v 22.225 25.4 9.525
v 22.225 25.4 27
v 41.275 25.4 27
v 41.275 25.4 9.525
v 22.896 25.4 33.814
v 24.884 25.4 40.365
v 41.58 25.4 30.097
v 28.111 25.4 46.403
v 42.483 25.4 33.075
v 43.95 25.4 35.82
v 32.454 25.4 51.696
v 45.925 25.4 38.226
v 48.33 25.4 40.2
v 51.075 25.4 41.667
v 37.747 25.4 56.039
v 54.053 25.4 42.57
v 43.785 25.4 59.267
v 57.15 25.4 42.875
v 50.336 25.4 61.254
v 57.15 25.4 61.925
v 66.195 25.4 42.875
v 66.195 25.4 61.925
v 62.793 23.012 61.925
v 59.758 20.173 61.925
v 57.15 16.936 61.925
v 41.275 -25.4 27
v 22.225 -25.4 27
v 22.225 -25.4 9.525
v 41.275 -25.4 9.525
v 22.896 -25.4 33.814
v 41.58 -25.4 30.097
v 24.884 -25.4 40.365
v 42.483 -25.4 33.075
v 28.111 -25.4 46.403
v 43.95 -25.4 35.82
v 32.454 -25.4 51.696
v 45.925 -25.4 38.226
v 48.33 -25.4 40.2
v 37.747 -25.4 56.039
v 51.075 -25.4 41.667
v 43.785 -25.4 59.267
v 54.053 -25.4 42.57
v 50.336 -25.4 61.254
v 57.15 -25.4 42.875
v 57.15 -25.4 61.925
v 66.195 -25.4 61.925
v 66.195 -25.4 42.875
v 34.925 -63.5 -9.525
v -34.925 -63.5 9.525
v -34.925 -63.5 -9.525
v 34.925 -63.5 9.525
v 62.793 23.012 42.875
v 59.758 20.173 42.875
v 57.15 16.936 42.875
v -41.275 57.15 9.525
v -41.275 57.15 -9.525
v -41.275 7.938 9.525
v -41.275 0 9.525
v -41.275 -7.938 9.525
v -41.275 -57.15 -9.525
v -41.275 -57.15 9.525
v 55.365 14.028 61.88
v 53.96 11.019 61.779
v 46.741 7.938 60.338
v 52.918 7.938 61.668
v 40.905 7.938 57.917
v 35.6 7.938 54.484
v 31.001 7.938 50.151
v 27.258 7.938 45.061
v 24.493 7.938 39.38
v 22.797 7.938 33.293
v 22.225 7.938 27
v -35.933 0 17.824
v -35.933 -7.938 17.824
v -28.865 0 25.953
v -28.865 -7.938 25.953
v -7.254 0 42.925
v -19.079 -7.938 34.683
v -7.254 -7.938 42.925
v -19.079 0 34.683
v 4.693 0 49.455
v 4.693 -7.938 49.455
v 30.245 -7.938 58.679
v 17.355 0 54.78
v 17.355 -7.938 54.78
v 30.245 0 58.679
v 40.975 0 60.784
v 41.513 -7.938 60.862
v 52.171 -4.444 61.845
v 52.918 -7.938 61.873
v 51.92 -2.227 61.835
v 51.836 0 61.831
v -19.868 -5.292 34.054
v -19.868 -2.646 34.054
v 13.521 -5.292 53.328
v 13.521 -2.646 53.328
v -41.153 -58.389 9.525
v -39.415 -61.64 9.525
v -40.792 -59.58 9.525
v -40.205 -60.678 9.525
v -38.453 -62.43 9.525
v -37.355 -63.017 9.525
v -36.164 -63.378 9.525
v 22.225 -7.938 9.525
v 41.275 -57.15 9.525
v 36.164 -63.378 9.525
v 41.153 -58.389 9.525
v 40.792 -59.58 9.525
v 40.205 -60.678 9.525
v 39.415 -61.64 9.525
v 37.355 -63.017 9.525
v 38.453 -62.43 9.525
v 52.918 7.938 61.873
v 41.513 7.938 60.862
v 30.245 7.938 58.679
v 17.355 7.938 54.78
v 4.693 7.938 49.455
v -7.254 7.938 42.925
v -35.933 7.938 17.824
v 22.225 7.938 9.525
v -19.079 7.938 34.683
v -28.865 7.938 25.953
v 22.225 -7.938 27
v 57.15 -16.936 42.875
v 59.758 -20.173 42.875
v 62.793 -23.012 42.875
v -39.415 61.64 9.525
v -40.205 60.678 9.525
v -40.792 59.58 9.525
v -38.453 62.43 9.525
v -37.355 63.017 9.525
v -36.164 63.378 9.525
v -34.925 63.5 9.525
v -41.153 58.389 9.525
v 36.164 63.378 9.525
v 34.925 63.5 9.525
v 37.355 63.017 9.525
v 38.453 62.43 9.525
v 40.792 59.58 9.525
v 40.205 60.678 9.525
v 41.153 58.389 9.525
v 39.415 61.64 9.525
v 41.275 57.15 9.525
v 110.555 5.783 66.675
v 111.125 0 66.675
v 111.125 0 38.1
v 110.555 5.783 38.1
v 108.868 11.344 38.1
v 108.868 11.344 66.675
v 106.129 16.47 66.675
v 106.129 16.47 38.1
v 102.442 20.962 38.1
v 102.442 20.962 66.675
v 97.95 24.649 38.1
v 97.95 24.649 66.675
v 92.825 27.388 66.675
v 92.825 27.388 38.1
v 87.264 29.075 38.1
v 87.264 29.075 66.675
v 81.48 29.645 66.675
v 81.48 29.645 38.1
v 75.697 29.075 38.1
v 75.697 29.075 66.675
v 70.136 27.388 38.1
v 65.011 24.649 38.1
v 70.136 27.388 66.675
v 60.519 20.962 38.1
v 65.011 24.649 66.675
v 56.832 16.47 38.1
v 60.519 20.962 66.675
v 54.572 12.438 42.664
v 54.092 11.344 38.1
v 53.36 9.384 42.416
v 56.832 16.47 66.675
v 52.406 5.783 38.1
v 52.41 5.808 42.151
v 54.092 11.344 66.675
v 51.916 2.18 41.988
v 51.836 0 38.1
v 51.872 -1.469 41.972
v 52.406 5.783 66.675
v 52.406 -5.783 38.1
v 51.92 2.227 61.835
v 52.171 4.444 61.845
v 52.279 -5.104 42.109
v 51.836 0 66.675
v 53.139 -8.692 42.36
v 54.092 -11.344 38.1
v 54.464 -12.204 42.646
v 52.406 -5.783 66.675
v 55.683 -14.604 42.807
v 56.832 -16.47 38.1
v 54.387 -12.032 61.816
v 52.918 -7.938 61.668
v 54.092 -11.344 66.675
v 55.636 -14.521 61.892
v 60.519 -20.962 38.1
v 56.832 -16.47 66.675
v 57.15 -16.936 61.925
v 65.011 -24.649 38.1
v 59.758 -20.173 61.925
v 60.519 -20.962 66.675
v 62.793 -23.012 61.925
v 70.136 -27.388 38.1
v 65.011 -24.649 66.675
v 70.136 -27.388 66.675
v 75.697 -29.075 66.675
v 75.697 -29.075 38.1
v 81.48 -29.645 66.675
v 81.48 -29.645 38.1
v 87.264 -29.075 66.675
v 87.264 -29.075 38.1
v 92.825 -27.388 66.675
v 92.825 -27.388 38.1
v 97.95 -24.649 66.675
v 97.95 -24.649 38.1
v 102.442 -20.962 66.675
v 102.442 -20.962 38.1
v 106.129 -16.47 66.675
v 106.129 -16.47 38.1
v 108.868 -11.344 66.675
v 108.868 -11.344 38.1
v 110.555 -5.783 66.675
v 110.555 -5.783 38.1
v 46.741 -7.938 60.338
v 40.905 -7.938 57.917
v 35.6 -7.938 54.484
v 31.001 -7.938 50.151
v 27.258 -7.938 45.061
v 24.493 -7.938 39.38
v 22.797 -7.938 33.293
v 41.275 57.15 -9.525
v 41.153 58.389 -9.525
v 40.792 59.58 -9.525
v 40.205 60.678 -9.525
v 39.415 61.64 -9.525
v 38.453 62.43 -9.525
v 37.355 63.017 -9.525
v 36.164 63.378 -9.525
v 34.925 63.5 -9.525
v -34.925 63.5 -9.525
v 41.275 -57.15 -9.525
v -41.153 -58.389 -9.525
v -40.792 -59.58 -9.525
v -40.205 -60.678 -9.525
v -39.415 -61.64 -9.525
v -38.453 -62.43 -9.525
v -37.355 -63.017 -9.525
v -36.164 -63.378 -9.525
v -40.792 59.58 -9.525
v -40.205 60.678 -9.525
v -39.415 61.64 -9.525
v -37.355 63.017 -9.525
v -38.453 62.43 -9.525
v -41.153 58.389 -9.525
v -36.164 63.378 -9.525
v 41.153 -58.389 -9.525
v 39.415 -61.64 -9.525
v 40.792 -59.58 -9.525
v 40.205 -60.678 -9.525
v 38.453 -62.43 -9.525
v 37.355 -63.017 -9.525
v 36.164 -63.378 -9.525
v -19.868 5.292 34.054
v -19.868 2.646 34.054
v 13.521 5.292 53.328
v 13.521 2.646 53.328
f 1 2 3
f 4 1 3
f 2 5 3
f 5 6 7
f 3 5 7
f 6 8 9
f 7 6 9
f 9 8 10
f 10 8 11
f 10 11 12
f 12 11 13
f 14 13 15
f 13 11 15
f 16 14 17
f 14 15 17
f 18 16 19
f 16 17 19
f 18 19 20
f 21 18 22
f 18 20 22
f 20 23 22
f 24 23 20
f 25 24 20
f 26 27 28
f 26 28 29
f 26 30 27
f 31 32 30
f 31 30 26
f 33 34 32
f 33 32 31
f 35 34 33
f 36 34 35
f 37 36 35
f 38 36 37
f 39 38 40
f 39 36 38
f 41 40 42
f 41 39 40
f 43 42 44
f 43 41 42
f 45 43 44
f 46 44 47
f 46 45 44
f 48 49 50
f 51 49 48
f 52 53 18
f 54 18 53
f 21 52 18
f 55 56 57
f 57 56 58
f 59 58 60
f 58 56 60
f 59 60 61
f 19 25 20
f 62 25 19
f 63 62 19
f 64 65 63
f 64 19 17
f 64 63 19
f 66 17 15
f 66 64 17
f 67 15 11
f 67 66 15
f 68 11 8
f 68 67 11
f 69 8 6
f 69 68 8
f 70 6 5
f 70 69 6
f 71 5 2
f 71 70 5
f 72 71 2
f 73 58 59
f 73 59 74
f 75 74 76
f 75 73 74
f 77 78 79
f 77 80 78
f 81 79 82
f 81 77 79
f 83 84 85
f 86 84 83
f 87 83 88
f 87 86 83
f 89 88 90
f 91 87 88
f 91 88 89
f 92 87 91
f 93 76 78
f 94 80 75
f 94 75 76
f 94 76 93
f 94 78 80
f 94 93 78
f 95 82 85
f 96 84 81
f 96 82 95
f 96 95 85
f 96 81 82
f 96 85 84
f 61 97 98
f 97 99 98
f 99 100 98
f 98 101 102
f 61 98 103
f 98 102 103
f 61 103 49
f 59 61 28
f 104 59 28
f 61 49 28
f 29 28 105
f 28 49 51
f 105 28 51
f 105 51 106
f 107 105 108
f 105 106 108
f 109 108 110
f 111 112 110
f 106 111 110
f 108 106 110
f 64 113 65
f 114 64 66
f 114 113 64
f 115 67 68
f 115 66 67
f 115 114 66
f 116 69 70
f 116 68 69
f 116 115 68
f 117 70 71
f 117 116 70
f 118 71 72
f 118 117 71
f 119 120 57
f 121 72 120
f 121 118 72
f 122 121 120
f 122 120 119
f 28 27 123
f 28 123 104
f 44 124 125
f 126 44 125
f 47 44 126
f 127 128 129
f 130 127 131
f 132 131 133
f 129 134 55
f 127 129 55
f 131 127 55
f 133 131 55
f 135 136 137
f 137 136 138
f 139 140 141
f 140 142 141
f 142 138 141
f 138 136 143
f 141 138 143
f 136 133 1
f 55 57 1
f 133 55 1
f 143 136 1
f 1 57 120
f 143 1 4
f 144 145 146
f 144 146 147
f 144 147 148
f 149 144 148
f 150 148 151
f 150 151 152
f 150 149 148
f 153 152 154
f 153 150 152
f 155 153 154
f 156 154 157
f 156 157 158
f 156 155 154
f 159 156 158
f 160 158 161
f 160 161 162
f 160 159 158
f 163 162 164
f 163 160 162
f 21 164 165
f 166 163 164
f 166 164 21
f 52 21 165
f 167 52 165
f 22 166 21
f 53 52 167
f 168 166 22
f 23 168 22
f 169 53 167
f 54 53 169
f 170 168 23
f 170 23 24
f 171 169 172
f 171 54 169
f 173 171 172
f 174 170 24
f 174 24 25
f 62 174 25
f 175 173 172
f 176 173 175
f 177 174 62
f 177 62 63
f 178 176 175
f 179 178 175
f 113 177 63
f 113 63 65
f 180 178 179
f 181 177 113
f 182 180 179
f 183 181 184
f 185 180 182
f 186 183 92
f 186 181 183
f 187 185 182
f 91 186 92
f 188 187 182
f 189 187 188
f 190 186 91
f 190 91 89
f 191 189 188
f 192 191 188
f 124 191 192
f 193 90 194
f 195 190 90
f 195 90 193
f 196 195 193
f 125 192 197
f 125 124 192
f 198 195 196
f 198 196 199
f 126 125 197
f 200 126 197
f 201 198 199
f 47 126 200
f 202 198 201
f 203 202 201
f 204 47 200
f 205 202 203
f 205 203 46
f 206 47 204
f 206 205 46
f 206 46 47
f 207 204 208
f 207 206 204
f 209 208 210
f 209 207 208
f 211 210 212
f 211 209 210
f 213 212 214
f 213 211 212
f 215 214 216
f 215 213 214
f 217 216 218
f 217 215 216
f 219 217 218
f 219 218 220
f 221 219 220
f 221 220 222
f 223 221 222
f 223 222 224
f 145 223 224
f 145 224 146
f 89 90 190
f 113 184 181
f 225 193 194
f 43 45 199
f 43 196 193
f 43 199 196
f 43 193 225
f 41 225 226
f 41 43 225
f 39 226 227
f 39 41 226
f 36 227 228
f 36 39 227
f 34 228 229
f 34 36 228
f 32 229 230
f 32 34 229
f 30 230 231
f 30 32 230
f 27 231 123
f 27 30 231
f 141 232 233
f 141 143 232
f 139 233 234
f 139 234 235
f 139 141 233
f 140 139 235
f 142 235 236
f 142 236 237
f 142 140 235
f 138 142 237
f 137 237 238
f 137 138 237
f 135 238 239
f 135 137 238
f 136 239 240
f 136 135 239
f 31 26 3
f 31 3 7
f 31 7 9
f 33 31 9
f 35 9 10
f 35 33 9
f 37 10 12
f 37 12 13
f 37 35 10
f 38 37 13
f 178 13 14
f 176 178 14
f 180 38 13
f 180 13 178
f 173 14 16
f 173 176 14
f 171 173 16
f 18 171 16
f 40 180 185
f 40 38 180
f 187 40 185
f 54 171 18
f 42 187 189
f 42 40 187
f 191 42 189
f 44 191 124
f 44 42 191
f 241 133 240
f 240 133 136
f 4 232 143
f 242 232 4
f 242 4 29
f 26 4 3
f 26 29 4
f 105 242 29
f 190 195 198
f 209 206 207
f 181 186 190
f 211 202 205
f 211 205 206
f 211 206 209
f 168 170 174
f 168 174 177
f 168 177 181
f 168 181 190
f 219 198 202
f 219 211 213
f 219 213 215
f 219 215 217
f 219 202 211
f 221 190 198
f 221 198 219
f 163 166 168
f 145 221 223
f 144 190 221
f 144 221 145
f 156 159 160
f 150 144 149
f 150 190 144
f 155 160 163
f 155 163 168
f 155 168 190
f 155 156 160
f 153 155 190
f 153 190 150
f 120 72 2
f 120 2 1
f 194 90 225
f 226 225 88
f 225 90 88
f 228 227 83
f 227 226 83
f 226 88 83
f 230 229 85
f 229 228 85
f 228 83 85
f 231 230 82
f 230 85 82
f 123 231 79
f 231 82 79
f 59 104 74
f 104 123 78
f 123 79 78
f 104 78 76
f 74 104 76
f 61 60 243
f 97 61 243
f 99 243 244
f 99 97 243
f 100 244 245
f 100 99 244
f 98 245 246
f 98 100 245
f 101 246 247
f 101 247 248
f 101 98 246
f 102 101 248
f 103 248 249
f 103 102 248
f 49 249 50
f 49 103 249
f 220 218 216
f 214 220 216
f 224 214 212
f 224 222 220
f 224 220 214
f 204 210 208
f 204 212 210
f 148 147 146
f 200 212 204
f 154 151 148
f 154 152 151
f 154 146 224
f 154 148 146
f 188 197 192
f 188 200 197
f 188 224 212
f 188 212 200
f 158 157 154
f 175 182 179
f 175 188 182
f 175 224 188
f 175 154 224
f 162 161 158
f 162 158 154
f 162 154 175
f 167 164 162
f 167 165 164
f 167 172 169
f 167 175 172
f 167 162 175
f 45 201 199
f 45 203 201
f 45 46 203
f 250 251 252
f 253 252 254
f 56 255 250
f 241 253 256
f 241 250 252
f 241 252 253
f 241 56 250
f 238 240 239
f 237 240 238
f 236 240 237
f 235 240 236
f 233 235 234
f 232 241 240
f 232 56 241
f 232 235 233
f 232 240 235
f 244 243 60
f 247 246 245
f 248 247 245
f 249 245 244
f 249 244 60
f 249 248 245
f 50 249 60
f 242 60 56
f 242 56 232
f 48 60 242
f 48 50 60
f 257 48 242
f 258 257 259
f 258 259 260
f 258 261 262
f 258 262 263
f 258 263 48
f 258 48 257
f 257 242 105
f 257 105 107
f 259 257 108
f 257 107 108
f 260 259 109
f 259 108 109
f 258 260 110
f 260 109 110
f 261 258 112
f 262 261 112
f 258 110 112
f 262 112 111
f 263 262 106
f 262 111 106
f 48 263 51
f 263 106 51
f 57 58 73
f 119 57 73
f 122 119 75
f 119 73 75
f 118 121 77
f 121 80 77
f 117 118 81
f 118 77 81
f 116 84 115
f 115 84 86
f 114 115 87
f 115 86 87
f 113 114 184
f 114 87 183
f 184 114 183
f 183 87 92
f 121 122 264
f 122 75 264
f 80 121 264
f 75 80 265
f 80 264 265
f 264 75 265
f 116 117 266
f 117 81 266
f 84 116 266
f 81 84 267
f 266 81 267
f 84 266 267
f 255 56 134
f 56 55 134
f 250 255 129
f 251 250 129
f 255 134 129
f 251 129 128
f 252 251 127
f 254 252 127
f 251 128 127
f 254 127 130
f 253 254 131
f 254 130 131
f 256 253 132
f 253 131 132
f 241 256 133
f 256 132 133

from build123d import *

# Parameters (mm, degrees)
F1_W     = 82.55
F1_H     = 19.05
F2_DEPTH = 63.5
F0_W     = 21.1554604056
F0_H     = 19.05
F3_DEPTH = 25.4
F4_DEPTH = 7.9375
F6_R     = 6.35
F7_R     = 6.35


with BuildPart() as f2:
    # F1 (on Front) → F2 (new body, symmetric)
    with BuildSketch(Plane.XZ):
        Rectangle(F1_W, F1_H)
    extrude(amount=F2_DEPTH, both=True)

    # F0 (on Front) → F3 (join, symmetric)
    with BuildSketch(Plane.XZ):
        with BuildLine():
            Line((22.225, 9.525), (41.275, 9.525))
            Line((41.275, 9.525), (41.275, 27.0002))
            ThreePointArc((41.275, 27.0002), (45.9246798487, 38.2255201513), (57.15, 42.8752))
            Line((57.15, 42.8752), (60.325, 42.8752))
            Line((60.325, 42.8752), (60.325, 61.9252))
            Line((60.325, 61.9252), (57.15, 61.9252))
            ThreePointArc((57.15, 61.9252), (32.4542956671, 51.6959043329), (22.225, 27.0002))
            Line((22.225, 27.0002), (22.225, 9.525))
        make_face()
        with Locations((70.9027302028, 52.4002)):
            Rectangle(F0_W, F0_H)
    extrude(amount=F3_DEPTH, both=True)

    # F0 (on Front) → F4 (join, symmetric)
    with BuildSketch(Plane.XZ):
        with BuildLine():
            add(Edge.make_bspline(
                [(-41.275, 9.525), (-27.3804180324, 35.7423387468), (15.3577309102, 62.309294939), (57.15, 61.9252)],
                knots=[0, 0, 0, 0, 111.5045361635, 111.5045361635, 111.5045361635, 111.5045361635], degree=3))
            Line((-41.275, 9.525), (22.225, 9.525))
            Line((22.225, 9.525), (22.225, 27.0002))
            ThreePointArc((22.225, 27.0002), (32.4542956671, 51.6959043329), (57.15, 61.9252))
        make_face()
    extrude(amount=F4_DEPTH, both=True)

    # F0 (on Front) → F5 (revolve)
    with BuildSketch(Plane.XZ):
        Polygon((81.4804604056, 66.675), (81.4804604056, 61.9252), (81.4804604056, 42.8752), (81.4804604056, 38.1), (111.125, 38.1), (111.125, 66.675), align=None)
    revolve(axis=Axis((81.4804604056, 0, 52.3875), (0, 0, 1)))

    # F6
    f6_edges = [f2.edges().sort_by_distance(p)[0] for p in [
        (41.275, -63.5, 0),
        (-41.275, -63.5, 0),
        (41.275, 63.5, 0),
    ]]
    fillet(f6_edges, radius=F6_R)

    # F7
    f7_edges = [f2.edges().sort_by_distance(p)[0] for p in [
        (-41.275, 63.5, 0),
    ]]
    fillet(f7_edges, radius=F7_R)


solid = f2.part
